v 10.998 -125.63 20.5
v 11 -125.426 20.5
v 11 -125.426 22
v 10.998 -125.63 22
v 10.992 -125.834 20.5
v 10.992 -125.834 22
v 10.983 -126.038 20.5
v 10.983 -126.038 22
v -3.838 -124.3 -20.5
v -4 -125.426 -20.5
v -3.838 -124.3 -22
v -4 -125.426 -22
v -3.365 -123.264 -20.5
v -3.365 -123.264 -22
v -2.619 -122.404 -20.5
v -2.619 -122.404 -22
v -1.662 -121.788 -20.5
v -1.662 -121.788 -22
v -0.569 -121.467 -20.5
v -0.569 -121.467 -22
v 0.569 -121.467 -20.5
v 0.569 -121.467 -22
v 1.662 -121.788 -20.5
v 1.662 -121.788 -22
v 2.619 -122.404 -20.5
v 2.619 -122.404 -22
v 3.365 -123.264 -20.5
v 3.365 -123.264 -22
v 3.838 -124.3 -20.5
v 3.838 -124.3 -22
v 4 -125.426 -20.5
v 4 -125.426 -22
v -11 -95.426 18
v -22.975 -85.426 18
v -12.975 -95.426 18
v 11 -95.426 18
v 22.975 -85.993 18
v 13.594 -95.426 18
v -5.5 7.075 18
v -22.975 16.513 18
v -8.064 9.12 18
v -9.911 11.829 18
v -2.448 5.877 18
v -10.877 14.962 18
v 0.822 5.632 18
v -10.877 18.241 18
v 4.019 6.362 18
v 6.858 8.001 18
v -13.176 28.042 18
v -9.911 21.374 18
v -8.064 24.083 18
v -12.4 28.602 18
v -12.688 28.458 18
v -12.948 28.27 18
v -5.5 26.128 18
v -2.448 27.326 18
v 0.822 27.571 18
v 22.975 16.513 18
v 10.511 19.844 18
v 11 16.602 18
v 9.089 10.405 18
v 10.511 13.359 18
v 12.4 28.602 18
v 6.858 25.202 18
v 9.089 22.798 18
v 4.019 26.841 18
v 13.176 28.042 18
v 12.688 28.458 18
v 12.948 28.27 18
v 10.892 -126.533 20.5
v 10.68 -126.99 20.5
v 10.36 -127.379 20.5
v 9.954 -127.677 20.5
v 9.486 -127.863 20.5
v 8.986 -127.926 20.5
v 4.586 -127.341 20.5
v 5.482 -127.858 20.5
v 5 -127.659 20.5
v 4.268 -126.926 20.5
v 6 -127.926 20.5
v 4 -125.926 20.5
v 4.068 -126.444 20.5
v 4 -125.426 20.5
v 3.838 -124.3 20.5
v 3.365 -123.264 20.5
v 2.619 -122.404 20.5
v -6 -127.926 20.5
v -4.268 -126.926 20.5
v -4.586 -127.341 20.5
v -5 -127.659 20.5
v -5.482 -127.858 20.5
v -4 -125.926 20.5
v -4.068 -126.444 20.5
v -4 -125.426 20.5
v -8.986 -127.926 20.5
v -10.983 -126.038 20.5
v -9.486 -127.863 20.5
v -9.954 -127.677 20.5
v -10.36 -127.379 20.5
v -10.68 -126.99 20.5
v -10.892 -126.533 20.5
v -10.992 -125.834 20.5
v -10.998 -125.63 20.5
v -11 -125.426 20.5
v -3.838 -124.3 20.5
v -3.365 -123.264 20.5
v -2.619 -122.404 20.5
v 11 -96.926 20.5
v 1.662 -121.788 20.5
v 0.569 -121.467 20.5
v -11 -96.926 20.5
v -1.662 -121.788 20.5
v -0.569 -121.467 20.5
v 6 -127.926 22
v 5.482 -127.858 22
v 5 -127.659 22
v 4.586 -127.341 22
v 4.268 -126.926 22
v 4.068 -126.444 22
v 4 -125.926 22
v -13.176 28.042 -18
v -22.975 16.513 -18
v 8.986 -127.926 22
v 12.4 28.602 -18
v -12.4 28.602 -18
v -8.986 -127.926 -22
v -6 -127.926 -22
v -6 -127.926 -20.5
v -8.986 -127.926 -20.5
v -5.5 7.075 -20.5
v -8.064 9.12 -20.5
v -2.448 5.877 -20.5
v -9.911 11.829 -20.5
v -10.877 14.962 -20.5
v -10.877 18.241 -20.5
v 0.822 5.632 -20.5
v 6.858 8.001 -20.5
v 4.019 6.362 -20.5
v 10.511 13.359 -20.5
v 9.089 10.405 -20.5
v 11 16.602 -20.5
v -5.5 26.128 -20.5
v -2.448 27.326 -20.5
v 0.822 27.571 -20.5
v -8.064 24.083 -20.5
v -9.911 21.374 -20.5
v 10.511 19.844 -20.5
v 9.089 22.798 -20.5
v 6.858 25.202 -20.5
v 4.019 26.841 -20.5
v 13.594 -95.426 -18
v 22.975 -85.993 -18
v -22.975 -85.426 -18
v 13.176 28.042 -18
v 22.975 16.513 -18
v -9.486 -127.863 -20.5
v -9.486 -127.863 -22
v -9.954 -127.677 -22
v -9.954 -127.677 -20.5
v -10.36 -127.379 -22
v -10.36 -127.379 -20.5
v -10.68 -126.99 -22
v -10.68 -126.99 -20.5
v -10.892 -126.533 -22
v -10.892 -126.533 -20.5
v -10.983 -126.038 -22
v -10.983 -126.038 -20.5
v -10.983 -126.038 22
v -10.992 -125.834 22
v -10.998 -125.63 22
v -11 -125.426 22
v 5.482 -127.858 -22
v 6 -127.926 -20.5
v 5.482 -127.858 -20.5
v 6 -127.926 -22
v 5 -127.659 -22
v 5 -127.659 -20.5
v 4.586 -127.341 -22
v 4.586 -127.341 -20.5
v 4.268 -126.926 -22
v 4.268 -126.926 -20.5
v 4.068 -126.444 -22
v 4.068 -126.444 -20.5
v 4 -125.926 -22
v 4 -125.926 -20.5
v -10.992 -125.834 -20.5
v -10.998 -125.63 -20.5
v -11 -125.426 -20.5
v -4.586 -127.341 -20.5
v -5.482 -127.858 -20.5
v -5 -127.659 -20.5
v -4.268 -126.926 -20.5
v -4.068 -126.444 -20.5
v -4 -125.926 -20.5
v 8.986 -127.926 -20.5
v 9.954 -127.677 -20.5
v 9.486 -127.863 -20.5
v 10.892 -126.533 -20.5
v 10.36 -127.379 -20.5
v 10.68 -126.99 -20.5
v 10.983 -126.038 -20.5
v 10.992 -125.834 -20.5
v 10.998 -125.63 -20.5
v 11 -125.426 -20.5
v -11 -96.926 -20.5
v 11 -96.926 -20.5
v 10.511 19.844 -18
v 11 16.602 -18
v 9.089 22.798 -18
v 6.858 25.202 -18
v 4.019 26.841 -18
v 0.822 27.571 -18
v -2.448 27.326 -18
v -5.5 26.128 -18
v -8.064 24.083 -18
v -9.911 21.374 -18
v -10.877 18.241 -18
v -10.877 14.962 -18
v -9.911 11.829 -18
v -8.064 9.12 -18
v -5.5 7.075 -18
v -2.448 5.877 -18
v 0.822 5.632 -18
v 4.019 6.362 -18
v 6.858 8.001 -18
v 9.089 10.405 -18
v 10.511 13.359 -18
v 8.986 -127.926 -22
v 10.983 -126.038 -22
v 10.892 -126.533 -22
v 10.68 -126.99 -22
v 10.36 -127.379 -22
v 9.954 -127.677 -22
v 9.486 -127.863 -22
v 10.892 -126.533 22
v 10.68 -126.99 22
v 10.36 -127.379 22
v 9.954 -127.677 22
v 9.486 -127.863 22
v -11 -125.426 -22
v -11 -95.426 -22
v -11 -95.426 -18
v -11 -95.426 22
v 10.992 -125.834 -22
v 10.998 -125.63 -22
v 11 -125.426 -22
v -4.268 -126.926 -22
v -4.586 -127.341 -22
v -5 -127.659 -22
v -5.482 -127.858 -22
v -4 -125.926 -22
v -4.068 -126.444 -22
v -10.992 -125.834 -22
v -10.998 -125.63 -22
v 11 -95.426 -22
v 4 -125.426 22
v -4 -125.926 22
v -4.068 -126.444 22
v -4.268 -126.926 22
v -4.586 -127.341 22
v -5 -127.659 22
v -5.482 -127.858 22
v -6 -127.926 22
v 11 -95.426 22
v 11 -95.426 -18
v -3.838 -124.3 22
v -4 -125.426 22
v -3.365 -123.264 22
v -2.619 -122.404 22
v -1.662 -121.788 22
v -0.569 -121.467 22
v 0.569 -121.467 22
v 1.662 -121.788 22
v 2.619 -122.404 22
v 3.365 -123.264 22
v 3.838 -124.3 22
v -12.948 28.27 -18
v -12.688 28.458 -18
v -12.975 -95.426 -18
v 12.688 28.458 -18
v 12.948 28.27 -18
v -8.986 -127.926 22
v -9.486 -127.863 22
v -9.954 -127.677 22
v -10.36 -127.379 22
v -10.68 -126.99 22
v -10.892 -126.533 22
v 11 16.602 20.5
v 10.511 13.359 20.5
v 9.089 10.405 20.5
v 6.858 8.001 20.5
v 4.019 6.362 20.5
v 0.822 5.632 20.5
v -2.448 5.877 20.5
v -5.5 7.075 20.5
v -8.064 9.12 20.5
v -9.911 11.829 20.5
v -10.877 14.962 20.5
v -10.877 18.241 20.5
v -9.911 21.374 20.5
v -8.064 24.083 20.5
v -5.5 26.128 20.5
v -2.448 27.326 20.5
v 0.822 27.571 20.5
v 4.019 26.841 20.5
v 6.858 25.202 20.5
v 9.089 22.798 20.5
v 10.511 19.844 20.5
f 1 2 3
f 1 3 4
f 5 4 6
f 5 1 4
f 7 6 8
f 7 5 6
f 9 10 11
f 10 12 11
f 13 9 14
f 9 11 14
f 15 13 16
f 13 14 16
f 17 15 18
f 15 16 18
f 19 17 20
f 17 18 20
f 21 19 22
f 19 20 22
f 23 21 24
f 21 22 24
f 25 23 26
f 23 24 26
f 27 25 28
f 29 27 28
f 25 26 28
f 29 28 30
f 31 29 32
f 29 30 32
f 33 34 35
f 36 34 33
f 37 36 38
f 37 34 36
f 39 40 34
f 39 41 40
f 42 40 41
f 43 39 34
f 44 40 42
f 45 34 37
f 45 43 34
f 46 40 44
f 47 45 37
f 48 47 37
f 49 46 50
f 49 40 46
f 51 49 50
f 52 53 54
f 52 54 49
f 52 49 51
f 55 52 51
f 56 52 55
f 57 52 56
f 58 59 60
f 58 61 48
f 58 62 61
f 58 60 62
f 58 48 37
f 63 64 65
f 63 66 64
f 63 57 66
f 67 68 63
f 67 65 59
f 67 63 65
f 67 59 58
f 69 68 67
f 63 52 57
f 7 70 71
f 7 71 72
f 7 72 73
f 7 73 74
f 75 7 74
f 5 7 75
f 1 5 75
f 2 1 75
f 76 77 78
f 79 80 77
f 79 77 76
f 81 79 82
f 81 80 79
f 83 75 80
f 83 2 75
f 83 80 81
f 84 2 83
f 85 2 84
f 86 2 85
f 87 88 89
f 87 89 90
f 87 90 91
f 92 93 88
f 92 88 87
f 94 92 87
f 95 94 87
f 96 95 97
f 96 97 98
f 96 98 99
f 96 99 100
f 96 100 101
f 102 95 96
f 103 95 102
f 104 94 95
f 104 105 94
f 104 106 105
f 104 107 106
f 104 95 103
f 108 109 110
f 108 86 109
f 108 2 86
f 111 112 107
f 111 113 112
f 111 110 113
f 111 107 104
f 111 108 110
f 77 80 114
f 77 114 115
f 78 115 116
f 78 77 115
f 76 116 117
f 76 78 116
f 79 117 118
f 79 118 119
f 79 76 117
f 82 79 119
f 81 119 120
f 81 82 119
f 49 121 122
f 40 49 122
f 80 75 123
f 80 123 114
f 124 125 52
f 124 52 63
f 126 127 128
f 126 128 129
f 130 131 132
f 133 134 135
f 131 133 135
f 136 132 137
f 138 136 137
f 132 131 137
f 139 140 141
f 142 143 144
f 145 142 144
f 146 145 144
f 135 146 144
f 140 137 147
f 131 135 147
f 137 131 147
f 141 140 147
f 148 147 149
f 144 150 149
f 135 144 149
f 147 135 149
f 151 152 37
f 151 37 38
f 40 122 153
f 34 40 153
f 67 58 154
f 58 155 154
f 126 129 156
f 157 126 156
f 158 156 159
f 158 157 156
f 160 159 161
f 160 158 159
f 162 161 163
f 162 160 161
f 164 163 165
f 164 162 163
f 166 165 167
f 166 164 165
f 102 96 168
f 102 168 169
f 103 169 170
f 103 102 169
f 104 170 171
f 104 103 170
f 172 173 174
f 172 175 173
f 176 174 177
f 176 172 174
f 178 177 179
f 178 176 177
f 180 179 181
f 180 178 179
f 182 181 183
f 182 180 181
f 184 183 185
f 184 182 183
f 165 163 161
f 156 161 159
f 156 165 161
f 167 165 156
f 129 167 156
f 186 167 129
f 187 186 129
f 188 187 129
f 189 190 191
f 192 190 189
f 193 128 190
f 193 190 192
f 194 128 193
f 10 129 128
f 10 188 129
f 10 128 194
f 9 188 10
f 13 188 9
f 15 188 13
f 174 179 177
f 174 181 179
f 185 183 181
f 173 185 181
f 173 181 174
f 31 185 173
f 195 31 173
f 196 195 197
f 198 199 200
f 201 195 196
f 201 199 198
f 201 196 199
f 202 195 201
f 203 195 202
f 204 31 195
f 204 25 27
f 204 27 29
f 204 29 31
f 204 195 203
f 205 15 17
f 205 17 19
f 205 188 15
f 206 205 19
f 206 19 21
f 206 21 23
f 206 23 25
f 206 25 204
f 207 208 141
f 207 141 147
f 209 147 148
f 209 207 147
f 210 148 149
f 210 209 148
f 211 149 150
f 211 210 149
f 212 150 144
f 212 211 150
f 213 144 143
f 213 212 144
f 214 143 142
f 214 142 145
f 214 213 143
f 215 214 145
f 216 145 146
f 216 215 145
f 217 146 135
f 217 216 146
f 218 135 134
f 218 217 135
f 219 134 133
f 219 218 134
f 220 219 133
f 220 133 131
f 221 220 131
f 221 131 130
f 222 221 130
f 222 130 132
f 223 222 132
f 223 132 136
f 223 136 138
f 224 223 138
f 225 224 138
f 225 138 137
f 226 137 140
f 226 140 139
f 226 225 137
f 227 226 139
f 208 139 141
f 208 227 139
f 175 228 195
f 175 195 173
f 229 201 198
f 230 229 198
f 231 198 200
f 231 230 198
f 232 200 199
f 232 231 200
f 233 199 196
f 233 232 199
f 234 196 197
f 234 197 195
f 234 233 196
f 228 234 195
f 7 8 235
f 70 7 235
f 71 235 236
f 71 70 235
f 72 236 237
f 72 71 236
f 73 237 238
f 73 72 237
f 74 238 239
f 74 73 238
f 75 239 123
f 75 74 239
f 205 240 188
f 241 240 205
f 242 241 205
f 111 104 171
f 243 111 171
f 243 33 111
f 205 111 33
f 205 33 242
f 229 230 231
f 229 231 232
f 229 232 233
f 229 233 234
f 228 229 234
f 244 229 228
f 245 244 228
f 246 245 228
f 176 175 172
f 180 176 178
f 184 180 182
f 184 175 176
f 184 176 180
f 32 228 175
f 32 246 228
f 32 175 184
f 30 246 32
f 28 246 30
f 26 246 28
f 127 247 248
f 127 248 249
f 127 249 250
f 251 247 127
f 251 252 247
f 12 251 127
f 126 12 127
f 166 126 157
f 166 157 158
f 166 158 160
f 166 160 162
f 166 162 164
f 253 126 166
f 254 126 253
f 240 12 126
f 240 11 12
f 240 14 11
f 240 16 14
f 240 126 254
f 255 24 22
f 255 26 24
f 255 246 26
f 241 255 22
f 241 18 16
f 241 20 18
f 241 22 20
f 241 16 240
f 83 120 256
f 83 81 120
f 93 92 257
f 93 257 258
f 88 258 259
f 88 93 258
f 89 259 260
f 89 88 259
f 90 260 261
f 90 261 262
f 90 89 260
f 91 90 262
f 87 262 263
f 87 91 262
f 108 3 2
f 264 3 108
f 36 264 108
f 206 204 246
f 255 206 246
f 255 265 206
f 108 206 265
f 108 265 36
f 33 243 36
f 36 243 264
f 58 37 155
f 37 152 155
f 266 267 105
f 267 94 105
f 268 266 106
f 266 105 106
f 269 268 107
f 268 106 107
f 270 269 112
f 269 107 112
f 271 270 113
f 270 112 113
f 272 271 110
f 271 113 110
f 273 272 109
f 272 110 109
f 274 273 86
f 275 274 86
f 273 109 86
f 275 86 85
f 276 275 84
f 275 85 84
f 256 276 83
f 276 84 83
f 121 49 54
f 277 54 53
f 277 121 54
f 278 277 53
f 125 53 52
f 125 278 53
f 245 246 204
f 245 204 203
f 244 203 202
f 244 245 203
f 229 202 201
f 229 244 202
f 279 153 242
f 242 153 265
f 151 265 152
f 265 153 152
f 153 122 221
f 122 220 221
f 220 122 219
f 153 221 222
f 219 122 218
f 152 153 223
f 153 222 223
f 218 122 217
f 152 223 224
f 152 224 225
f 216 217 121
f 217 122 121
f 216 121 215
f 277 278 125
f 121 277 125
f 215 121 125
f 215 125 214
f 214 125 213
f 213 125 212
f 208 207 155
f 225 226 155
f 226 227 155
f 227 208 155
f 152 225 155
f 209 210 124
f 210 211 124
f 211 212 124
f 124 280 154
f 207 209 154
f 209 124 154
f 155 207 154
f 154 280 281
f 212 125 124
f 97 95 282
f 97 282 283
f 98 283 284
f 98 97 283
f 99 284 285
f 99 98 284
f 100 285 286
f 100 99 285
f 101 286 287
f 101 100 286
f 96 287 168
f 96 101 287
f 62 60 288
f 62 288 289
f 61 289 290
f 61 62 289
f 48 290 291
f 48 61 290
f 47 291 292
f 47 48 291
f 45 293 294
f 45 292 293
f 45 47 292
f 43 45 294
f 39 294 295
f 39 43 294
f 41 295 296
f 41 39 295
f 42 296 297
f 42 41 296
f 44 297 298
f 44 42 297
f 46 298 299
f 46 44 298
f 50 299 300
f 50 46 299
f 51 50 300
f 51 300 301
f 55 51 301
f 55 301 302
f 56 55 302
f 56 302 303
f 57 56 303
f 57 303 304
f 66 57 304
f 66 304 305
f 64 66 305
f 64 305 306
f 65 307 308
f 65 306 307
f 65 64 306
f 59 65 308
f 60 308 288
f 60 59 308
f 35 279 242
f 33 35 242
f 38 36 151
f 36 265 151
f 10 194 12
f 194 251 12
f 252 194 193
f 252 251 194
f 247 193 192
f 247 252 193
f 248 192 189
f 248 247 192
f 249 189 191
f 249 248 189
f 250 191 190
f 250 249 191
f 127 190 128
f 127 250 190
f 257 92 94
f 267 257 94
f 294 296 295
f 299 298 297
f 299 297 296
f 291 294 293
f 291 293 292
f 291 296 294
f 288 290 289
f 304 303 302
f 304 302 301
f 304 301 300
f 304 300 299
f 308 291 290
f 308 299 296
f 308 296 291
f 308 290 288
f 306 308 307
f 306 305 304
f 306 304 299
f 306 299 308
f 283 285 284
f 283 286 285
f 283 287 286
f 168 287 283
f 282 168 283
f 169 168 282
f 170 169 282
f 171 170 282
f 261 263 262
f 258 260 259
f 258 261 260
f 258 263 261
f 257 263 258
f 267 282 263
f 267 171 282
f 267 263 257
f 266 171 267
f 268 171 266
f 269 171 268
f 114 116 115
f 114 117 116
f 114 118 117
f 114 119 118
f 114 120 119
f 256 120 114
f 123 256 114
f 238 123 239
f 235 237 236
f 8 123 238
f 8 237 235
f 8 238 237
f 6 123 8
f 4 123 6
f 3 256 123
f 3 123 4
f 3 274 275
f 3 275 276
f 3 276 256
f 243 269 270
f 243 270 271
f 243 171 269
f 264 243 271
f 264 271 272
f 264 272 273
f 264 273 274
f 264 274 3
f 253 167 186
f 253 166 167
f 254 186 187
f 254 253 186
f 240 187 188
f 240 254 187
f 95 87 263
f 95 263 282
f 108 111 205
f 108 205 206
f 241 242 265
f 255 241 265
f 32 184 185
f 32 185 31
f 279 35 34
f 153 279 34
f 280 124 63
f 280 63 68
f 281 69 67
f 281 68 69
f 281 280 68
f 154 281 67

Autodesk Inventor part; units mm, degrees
ref_plane "YZ Plane" through (0, 0, 0) normal (1, 0, 0) x (0, 1, 0)
ref_plane "XZ Plane" through (0, 0, 0) normal (0, 1, 0) x (-1, 0, 0)
ref_plane "XY Plane" through (0, 0, 0) normal (0, 0, 1) x (1, 0, 0)
sketch "Sketch1" plane through (0, 0, 0) normal (0, 0, 1) x (1, 0, 0)
  line L0 (22.975, -85.9934) -> (22.975, 16.5133)
  line L1 (22.975, 16.5133) -> (13.1755, 28.0421)
  arc A0 (13.1755, 28.0421) -> (12.4, 28.6015) centre (11.6516, 26.7468) ccw
  arc A1 (-12.4, 28.6015) -> (-13.1755, 28.0421) centre (-11.6516, 26.7468) ccw
  line L2 (-13.1755, 28.0421) -> (-22.975, 16.5133)
  line L3 (-22.975, 16.5133) -> (-22.975, -85.4265)
  line L4 (-12.975, -95.4265) -> (-22.975, -85.4265)
  line L5 (-12.975, -95.4265) -> (13.594, -95.4265)
  line L6 (22.975, -85.9934) -> (13.594, -95.4265)
  line L7 (-6, -127.9265) -> (-8.9861, -127.9265)
  arc A2 (-6, -127.9265) -> (-4, -125.9265) centre (-6, -125.9265) ccw
  line L8 (-4, -125.9265) -> (-4, -125.4265)
  arc A3 (4, -125.4265) -> (-4, -125.4265) centre (0, -125.4265) ccw
  line L9 (4, -125.9265) -> (4, -125.4265)
  arc A4 (4, -125.9265) -> (6, -127.9265) centre (6, -125.9265) ccw
  line L10 (8.9861, -127.9265) -> (6, -127.9265)
  arc A5 (8.9861, -127.9265) -> (10.983, -126.0376) centre (8.9861, -125.9265) ccw
  arc A6 (10.983, -126.0376) -> (11, -125.4265) centre (0, -125.4265) ccw
  line L11 (11, -125.4265) -> (11, -96.9265)
  line L12 (-11, -125.4265) -> (-11, -96.9265)
  arc A7 (-11, -125.4265) -> (-10.983, -126.0376) centre (0, -125.4265) ccw
  arc A8 (-10.983, -126.0376) -> (-8.9861, -127.9265) centre (-8.9861, -125.9265) ccw
  line L13 (-11, -96.9265) -> (-11, -95.4265)
  line L14 (11, -96.9265) -> (11, -95.4265)
  line L15 (-12.4, 28.6015) -> (12.4, 28.6015)
  circle A9 centre (0, 16.6015) radius 11
  dimension "d0" = 22
extrude "Extrusion1" add sketch "Sketch1" along normal mid plane 36 contours L6 L5 L4 L3 L2 A1 L15 A0 L1 L0
extrude "Extrusion2" add sketch "Sketch1" along normal mid plane 41 contours A9
sketch "Sketch2" plane through (-12.975, -95.4265, 18) normal (0, -1, 0) x (1, 0, 0)
  line L0 (1.975, 4) -> (23.975, 4)
  line L1 (23.975, 4) -> (23.975, -40)
  line L2 (23.975, -40) -> (1.975, -40)
  line L3 (1.975, -40) -> (1.975, 4)
  point P0 (12.975, -18)
  point P1 (12.975, -18)
  point P2 (12.975, -18)
  dimension "d5" = 22
  dimension "d6" = 44
  dimension "d16" = 22
extrude "Extrusion3" add sketch "Sketch2" along normal blind 1.5
sketch "Sketch3" plane through (-12.975, -96.9265, 18) normal (0, -1, 0) x (1, 0, 0)
  line L0 (23.975, 4) -> (23.975, -40) projected
  line L1 (1.975, -40) -> (1.975, 4) projected
  line L2 (1.975, 4) -> (23.975, 4)
  line L3 (23.975, 4) -> (23.975, 2.5)
  line L4 (23.975, 2.5) -> (1.975, 2.5)
  line L5 (1.975, 2.5) -> (1.975, 4)
  line L6 (23.975, -40) -> (1.975, -40)
  line L7 (1.975, -40) -> (1.975, -38.5)
  line L8 (1.975, -38.5) -> (23.975, -38.5)
  line L9 (23.975, -38.5) -> (23.975, -40)
  point P0 (12.975, -18)
  dimension "d9" = 1.5
  dimension "d10" = 1.5
extrude "Extrusion4" add sketch "Sketch3" along normal blind 32 contours L0 L4 L1 L2 | L0 L6 L1 L8
sketch "Sketch4" plane through (11, -95.4265, -22) normal (0, 0, -1) x (-1, 0, 0)
  line L0 (22, 0) -> (22, -33.5) projected
  line L1 (0, 0) -> (22, 0) projected
  line L2 (0, 0) -> (0, -33.5) projected
  line L3 (0, -33.5) -> (22, -33.5) projected
  arc A0 (15, -30) -> (7, -30) centre (11, -30) ccw projected
  arc A1 (5, -32.5) -> (7, -30.5) centre (5, -30.5) ccw projected
  line L4 (2.0139, -32.5) -> (5, -32.5) projected
  line L5 (15, -30.5) -> (15, -30) projected
  line L6 (7, -30.5) -> (7, -30) projected
  arc A2 (0.017, -30.6111) -> (2.0139, -32.5) centre (2.0139, -30.5) ccw projected
  line L7 (17, -32.5) -> (19.9861, -32.5) projected
  arc A3 (15, -30.5) -> (17, -32.5) centre (17, -30.5) ccw projected
  arc A4 (19.9861, -32.5) -> (21.983, -30.6111) centre (19.9861, -30.5) ccw projected
  arc A5 (21.983, -30.6111) -> (22, -30) centre (11, -30) ccw projected
  arc A6 (0, -30) -> (0.017, -30.6111) centre (11, -30) ccw projected
  point P0 (11, 95.4265)
extrude "Extrusion5" cut sketch "Sketch4" against normal through all contours L0 L3 L2 A6 A2 L4 A1 L6 A0 L5 A3 L7 A4 A5
properties part number "ForeArm"
